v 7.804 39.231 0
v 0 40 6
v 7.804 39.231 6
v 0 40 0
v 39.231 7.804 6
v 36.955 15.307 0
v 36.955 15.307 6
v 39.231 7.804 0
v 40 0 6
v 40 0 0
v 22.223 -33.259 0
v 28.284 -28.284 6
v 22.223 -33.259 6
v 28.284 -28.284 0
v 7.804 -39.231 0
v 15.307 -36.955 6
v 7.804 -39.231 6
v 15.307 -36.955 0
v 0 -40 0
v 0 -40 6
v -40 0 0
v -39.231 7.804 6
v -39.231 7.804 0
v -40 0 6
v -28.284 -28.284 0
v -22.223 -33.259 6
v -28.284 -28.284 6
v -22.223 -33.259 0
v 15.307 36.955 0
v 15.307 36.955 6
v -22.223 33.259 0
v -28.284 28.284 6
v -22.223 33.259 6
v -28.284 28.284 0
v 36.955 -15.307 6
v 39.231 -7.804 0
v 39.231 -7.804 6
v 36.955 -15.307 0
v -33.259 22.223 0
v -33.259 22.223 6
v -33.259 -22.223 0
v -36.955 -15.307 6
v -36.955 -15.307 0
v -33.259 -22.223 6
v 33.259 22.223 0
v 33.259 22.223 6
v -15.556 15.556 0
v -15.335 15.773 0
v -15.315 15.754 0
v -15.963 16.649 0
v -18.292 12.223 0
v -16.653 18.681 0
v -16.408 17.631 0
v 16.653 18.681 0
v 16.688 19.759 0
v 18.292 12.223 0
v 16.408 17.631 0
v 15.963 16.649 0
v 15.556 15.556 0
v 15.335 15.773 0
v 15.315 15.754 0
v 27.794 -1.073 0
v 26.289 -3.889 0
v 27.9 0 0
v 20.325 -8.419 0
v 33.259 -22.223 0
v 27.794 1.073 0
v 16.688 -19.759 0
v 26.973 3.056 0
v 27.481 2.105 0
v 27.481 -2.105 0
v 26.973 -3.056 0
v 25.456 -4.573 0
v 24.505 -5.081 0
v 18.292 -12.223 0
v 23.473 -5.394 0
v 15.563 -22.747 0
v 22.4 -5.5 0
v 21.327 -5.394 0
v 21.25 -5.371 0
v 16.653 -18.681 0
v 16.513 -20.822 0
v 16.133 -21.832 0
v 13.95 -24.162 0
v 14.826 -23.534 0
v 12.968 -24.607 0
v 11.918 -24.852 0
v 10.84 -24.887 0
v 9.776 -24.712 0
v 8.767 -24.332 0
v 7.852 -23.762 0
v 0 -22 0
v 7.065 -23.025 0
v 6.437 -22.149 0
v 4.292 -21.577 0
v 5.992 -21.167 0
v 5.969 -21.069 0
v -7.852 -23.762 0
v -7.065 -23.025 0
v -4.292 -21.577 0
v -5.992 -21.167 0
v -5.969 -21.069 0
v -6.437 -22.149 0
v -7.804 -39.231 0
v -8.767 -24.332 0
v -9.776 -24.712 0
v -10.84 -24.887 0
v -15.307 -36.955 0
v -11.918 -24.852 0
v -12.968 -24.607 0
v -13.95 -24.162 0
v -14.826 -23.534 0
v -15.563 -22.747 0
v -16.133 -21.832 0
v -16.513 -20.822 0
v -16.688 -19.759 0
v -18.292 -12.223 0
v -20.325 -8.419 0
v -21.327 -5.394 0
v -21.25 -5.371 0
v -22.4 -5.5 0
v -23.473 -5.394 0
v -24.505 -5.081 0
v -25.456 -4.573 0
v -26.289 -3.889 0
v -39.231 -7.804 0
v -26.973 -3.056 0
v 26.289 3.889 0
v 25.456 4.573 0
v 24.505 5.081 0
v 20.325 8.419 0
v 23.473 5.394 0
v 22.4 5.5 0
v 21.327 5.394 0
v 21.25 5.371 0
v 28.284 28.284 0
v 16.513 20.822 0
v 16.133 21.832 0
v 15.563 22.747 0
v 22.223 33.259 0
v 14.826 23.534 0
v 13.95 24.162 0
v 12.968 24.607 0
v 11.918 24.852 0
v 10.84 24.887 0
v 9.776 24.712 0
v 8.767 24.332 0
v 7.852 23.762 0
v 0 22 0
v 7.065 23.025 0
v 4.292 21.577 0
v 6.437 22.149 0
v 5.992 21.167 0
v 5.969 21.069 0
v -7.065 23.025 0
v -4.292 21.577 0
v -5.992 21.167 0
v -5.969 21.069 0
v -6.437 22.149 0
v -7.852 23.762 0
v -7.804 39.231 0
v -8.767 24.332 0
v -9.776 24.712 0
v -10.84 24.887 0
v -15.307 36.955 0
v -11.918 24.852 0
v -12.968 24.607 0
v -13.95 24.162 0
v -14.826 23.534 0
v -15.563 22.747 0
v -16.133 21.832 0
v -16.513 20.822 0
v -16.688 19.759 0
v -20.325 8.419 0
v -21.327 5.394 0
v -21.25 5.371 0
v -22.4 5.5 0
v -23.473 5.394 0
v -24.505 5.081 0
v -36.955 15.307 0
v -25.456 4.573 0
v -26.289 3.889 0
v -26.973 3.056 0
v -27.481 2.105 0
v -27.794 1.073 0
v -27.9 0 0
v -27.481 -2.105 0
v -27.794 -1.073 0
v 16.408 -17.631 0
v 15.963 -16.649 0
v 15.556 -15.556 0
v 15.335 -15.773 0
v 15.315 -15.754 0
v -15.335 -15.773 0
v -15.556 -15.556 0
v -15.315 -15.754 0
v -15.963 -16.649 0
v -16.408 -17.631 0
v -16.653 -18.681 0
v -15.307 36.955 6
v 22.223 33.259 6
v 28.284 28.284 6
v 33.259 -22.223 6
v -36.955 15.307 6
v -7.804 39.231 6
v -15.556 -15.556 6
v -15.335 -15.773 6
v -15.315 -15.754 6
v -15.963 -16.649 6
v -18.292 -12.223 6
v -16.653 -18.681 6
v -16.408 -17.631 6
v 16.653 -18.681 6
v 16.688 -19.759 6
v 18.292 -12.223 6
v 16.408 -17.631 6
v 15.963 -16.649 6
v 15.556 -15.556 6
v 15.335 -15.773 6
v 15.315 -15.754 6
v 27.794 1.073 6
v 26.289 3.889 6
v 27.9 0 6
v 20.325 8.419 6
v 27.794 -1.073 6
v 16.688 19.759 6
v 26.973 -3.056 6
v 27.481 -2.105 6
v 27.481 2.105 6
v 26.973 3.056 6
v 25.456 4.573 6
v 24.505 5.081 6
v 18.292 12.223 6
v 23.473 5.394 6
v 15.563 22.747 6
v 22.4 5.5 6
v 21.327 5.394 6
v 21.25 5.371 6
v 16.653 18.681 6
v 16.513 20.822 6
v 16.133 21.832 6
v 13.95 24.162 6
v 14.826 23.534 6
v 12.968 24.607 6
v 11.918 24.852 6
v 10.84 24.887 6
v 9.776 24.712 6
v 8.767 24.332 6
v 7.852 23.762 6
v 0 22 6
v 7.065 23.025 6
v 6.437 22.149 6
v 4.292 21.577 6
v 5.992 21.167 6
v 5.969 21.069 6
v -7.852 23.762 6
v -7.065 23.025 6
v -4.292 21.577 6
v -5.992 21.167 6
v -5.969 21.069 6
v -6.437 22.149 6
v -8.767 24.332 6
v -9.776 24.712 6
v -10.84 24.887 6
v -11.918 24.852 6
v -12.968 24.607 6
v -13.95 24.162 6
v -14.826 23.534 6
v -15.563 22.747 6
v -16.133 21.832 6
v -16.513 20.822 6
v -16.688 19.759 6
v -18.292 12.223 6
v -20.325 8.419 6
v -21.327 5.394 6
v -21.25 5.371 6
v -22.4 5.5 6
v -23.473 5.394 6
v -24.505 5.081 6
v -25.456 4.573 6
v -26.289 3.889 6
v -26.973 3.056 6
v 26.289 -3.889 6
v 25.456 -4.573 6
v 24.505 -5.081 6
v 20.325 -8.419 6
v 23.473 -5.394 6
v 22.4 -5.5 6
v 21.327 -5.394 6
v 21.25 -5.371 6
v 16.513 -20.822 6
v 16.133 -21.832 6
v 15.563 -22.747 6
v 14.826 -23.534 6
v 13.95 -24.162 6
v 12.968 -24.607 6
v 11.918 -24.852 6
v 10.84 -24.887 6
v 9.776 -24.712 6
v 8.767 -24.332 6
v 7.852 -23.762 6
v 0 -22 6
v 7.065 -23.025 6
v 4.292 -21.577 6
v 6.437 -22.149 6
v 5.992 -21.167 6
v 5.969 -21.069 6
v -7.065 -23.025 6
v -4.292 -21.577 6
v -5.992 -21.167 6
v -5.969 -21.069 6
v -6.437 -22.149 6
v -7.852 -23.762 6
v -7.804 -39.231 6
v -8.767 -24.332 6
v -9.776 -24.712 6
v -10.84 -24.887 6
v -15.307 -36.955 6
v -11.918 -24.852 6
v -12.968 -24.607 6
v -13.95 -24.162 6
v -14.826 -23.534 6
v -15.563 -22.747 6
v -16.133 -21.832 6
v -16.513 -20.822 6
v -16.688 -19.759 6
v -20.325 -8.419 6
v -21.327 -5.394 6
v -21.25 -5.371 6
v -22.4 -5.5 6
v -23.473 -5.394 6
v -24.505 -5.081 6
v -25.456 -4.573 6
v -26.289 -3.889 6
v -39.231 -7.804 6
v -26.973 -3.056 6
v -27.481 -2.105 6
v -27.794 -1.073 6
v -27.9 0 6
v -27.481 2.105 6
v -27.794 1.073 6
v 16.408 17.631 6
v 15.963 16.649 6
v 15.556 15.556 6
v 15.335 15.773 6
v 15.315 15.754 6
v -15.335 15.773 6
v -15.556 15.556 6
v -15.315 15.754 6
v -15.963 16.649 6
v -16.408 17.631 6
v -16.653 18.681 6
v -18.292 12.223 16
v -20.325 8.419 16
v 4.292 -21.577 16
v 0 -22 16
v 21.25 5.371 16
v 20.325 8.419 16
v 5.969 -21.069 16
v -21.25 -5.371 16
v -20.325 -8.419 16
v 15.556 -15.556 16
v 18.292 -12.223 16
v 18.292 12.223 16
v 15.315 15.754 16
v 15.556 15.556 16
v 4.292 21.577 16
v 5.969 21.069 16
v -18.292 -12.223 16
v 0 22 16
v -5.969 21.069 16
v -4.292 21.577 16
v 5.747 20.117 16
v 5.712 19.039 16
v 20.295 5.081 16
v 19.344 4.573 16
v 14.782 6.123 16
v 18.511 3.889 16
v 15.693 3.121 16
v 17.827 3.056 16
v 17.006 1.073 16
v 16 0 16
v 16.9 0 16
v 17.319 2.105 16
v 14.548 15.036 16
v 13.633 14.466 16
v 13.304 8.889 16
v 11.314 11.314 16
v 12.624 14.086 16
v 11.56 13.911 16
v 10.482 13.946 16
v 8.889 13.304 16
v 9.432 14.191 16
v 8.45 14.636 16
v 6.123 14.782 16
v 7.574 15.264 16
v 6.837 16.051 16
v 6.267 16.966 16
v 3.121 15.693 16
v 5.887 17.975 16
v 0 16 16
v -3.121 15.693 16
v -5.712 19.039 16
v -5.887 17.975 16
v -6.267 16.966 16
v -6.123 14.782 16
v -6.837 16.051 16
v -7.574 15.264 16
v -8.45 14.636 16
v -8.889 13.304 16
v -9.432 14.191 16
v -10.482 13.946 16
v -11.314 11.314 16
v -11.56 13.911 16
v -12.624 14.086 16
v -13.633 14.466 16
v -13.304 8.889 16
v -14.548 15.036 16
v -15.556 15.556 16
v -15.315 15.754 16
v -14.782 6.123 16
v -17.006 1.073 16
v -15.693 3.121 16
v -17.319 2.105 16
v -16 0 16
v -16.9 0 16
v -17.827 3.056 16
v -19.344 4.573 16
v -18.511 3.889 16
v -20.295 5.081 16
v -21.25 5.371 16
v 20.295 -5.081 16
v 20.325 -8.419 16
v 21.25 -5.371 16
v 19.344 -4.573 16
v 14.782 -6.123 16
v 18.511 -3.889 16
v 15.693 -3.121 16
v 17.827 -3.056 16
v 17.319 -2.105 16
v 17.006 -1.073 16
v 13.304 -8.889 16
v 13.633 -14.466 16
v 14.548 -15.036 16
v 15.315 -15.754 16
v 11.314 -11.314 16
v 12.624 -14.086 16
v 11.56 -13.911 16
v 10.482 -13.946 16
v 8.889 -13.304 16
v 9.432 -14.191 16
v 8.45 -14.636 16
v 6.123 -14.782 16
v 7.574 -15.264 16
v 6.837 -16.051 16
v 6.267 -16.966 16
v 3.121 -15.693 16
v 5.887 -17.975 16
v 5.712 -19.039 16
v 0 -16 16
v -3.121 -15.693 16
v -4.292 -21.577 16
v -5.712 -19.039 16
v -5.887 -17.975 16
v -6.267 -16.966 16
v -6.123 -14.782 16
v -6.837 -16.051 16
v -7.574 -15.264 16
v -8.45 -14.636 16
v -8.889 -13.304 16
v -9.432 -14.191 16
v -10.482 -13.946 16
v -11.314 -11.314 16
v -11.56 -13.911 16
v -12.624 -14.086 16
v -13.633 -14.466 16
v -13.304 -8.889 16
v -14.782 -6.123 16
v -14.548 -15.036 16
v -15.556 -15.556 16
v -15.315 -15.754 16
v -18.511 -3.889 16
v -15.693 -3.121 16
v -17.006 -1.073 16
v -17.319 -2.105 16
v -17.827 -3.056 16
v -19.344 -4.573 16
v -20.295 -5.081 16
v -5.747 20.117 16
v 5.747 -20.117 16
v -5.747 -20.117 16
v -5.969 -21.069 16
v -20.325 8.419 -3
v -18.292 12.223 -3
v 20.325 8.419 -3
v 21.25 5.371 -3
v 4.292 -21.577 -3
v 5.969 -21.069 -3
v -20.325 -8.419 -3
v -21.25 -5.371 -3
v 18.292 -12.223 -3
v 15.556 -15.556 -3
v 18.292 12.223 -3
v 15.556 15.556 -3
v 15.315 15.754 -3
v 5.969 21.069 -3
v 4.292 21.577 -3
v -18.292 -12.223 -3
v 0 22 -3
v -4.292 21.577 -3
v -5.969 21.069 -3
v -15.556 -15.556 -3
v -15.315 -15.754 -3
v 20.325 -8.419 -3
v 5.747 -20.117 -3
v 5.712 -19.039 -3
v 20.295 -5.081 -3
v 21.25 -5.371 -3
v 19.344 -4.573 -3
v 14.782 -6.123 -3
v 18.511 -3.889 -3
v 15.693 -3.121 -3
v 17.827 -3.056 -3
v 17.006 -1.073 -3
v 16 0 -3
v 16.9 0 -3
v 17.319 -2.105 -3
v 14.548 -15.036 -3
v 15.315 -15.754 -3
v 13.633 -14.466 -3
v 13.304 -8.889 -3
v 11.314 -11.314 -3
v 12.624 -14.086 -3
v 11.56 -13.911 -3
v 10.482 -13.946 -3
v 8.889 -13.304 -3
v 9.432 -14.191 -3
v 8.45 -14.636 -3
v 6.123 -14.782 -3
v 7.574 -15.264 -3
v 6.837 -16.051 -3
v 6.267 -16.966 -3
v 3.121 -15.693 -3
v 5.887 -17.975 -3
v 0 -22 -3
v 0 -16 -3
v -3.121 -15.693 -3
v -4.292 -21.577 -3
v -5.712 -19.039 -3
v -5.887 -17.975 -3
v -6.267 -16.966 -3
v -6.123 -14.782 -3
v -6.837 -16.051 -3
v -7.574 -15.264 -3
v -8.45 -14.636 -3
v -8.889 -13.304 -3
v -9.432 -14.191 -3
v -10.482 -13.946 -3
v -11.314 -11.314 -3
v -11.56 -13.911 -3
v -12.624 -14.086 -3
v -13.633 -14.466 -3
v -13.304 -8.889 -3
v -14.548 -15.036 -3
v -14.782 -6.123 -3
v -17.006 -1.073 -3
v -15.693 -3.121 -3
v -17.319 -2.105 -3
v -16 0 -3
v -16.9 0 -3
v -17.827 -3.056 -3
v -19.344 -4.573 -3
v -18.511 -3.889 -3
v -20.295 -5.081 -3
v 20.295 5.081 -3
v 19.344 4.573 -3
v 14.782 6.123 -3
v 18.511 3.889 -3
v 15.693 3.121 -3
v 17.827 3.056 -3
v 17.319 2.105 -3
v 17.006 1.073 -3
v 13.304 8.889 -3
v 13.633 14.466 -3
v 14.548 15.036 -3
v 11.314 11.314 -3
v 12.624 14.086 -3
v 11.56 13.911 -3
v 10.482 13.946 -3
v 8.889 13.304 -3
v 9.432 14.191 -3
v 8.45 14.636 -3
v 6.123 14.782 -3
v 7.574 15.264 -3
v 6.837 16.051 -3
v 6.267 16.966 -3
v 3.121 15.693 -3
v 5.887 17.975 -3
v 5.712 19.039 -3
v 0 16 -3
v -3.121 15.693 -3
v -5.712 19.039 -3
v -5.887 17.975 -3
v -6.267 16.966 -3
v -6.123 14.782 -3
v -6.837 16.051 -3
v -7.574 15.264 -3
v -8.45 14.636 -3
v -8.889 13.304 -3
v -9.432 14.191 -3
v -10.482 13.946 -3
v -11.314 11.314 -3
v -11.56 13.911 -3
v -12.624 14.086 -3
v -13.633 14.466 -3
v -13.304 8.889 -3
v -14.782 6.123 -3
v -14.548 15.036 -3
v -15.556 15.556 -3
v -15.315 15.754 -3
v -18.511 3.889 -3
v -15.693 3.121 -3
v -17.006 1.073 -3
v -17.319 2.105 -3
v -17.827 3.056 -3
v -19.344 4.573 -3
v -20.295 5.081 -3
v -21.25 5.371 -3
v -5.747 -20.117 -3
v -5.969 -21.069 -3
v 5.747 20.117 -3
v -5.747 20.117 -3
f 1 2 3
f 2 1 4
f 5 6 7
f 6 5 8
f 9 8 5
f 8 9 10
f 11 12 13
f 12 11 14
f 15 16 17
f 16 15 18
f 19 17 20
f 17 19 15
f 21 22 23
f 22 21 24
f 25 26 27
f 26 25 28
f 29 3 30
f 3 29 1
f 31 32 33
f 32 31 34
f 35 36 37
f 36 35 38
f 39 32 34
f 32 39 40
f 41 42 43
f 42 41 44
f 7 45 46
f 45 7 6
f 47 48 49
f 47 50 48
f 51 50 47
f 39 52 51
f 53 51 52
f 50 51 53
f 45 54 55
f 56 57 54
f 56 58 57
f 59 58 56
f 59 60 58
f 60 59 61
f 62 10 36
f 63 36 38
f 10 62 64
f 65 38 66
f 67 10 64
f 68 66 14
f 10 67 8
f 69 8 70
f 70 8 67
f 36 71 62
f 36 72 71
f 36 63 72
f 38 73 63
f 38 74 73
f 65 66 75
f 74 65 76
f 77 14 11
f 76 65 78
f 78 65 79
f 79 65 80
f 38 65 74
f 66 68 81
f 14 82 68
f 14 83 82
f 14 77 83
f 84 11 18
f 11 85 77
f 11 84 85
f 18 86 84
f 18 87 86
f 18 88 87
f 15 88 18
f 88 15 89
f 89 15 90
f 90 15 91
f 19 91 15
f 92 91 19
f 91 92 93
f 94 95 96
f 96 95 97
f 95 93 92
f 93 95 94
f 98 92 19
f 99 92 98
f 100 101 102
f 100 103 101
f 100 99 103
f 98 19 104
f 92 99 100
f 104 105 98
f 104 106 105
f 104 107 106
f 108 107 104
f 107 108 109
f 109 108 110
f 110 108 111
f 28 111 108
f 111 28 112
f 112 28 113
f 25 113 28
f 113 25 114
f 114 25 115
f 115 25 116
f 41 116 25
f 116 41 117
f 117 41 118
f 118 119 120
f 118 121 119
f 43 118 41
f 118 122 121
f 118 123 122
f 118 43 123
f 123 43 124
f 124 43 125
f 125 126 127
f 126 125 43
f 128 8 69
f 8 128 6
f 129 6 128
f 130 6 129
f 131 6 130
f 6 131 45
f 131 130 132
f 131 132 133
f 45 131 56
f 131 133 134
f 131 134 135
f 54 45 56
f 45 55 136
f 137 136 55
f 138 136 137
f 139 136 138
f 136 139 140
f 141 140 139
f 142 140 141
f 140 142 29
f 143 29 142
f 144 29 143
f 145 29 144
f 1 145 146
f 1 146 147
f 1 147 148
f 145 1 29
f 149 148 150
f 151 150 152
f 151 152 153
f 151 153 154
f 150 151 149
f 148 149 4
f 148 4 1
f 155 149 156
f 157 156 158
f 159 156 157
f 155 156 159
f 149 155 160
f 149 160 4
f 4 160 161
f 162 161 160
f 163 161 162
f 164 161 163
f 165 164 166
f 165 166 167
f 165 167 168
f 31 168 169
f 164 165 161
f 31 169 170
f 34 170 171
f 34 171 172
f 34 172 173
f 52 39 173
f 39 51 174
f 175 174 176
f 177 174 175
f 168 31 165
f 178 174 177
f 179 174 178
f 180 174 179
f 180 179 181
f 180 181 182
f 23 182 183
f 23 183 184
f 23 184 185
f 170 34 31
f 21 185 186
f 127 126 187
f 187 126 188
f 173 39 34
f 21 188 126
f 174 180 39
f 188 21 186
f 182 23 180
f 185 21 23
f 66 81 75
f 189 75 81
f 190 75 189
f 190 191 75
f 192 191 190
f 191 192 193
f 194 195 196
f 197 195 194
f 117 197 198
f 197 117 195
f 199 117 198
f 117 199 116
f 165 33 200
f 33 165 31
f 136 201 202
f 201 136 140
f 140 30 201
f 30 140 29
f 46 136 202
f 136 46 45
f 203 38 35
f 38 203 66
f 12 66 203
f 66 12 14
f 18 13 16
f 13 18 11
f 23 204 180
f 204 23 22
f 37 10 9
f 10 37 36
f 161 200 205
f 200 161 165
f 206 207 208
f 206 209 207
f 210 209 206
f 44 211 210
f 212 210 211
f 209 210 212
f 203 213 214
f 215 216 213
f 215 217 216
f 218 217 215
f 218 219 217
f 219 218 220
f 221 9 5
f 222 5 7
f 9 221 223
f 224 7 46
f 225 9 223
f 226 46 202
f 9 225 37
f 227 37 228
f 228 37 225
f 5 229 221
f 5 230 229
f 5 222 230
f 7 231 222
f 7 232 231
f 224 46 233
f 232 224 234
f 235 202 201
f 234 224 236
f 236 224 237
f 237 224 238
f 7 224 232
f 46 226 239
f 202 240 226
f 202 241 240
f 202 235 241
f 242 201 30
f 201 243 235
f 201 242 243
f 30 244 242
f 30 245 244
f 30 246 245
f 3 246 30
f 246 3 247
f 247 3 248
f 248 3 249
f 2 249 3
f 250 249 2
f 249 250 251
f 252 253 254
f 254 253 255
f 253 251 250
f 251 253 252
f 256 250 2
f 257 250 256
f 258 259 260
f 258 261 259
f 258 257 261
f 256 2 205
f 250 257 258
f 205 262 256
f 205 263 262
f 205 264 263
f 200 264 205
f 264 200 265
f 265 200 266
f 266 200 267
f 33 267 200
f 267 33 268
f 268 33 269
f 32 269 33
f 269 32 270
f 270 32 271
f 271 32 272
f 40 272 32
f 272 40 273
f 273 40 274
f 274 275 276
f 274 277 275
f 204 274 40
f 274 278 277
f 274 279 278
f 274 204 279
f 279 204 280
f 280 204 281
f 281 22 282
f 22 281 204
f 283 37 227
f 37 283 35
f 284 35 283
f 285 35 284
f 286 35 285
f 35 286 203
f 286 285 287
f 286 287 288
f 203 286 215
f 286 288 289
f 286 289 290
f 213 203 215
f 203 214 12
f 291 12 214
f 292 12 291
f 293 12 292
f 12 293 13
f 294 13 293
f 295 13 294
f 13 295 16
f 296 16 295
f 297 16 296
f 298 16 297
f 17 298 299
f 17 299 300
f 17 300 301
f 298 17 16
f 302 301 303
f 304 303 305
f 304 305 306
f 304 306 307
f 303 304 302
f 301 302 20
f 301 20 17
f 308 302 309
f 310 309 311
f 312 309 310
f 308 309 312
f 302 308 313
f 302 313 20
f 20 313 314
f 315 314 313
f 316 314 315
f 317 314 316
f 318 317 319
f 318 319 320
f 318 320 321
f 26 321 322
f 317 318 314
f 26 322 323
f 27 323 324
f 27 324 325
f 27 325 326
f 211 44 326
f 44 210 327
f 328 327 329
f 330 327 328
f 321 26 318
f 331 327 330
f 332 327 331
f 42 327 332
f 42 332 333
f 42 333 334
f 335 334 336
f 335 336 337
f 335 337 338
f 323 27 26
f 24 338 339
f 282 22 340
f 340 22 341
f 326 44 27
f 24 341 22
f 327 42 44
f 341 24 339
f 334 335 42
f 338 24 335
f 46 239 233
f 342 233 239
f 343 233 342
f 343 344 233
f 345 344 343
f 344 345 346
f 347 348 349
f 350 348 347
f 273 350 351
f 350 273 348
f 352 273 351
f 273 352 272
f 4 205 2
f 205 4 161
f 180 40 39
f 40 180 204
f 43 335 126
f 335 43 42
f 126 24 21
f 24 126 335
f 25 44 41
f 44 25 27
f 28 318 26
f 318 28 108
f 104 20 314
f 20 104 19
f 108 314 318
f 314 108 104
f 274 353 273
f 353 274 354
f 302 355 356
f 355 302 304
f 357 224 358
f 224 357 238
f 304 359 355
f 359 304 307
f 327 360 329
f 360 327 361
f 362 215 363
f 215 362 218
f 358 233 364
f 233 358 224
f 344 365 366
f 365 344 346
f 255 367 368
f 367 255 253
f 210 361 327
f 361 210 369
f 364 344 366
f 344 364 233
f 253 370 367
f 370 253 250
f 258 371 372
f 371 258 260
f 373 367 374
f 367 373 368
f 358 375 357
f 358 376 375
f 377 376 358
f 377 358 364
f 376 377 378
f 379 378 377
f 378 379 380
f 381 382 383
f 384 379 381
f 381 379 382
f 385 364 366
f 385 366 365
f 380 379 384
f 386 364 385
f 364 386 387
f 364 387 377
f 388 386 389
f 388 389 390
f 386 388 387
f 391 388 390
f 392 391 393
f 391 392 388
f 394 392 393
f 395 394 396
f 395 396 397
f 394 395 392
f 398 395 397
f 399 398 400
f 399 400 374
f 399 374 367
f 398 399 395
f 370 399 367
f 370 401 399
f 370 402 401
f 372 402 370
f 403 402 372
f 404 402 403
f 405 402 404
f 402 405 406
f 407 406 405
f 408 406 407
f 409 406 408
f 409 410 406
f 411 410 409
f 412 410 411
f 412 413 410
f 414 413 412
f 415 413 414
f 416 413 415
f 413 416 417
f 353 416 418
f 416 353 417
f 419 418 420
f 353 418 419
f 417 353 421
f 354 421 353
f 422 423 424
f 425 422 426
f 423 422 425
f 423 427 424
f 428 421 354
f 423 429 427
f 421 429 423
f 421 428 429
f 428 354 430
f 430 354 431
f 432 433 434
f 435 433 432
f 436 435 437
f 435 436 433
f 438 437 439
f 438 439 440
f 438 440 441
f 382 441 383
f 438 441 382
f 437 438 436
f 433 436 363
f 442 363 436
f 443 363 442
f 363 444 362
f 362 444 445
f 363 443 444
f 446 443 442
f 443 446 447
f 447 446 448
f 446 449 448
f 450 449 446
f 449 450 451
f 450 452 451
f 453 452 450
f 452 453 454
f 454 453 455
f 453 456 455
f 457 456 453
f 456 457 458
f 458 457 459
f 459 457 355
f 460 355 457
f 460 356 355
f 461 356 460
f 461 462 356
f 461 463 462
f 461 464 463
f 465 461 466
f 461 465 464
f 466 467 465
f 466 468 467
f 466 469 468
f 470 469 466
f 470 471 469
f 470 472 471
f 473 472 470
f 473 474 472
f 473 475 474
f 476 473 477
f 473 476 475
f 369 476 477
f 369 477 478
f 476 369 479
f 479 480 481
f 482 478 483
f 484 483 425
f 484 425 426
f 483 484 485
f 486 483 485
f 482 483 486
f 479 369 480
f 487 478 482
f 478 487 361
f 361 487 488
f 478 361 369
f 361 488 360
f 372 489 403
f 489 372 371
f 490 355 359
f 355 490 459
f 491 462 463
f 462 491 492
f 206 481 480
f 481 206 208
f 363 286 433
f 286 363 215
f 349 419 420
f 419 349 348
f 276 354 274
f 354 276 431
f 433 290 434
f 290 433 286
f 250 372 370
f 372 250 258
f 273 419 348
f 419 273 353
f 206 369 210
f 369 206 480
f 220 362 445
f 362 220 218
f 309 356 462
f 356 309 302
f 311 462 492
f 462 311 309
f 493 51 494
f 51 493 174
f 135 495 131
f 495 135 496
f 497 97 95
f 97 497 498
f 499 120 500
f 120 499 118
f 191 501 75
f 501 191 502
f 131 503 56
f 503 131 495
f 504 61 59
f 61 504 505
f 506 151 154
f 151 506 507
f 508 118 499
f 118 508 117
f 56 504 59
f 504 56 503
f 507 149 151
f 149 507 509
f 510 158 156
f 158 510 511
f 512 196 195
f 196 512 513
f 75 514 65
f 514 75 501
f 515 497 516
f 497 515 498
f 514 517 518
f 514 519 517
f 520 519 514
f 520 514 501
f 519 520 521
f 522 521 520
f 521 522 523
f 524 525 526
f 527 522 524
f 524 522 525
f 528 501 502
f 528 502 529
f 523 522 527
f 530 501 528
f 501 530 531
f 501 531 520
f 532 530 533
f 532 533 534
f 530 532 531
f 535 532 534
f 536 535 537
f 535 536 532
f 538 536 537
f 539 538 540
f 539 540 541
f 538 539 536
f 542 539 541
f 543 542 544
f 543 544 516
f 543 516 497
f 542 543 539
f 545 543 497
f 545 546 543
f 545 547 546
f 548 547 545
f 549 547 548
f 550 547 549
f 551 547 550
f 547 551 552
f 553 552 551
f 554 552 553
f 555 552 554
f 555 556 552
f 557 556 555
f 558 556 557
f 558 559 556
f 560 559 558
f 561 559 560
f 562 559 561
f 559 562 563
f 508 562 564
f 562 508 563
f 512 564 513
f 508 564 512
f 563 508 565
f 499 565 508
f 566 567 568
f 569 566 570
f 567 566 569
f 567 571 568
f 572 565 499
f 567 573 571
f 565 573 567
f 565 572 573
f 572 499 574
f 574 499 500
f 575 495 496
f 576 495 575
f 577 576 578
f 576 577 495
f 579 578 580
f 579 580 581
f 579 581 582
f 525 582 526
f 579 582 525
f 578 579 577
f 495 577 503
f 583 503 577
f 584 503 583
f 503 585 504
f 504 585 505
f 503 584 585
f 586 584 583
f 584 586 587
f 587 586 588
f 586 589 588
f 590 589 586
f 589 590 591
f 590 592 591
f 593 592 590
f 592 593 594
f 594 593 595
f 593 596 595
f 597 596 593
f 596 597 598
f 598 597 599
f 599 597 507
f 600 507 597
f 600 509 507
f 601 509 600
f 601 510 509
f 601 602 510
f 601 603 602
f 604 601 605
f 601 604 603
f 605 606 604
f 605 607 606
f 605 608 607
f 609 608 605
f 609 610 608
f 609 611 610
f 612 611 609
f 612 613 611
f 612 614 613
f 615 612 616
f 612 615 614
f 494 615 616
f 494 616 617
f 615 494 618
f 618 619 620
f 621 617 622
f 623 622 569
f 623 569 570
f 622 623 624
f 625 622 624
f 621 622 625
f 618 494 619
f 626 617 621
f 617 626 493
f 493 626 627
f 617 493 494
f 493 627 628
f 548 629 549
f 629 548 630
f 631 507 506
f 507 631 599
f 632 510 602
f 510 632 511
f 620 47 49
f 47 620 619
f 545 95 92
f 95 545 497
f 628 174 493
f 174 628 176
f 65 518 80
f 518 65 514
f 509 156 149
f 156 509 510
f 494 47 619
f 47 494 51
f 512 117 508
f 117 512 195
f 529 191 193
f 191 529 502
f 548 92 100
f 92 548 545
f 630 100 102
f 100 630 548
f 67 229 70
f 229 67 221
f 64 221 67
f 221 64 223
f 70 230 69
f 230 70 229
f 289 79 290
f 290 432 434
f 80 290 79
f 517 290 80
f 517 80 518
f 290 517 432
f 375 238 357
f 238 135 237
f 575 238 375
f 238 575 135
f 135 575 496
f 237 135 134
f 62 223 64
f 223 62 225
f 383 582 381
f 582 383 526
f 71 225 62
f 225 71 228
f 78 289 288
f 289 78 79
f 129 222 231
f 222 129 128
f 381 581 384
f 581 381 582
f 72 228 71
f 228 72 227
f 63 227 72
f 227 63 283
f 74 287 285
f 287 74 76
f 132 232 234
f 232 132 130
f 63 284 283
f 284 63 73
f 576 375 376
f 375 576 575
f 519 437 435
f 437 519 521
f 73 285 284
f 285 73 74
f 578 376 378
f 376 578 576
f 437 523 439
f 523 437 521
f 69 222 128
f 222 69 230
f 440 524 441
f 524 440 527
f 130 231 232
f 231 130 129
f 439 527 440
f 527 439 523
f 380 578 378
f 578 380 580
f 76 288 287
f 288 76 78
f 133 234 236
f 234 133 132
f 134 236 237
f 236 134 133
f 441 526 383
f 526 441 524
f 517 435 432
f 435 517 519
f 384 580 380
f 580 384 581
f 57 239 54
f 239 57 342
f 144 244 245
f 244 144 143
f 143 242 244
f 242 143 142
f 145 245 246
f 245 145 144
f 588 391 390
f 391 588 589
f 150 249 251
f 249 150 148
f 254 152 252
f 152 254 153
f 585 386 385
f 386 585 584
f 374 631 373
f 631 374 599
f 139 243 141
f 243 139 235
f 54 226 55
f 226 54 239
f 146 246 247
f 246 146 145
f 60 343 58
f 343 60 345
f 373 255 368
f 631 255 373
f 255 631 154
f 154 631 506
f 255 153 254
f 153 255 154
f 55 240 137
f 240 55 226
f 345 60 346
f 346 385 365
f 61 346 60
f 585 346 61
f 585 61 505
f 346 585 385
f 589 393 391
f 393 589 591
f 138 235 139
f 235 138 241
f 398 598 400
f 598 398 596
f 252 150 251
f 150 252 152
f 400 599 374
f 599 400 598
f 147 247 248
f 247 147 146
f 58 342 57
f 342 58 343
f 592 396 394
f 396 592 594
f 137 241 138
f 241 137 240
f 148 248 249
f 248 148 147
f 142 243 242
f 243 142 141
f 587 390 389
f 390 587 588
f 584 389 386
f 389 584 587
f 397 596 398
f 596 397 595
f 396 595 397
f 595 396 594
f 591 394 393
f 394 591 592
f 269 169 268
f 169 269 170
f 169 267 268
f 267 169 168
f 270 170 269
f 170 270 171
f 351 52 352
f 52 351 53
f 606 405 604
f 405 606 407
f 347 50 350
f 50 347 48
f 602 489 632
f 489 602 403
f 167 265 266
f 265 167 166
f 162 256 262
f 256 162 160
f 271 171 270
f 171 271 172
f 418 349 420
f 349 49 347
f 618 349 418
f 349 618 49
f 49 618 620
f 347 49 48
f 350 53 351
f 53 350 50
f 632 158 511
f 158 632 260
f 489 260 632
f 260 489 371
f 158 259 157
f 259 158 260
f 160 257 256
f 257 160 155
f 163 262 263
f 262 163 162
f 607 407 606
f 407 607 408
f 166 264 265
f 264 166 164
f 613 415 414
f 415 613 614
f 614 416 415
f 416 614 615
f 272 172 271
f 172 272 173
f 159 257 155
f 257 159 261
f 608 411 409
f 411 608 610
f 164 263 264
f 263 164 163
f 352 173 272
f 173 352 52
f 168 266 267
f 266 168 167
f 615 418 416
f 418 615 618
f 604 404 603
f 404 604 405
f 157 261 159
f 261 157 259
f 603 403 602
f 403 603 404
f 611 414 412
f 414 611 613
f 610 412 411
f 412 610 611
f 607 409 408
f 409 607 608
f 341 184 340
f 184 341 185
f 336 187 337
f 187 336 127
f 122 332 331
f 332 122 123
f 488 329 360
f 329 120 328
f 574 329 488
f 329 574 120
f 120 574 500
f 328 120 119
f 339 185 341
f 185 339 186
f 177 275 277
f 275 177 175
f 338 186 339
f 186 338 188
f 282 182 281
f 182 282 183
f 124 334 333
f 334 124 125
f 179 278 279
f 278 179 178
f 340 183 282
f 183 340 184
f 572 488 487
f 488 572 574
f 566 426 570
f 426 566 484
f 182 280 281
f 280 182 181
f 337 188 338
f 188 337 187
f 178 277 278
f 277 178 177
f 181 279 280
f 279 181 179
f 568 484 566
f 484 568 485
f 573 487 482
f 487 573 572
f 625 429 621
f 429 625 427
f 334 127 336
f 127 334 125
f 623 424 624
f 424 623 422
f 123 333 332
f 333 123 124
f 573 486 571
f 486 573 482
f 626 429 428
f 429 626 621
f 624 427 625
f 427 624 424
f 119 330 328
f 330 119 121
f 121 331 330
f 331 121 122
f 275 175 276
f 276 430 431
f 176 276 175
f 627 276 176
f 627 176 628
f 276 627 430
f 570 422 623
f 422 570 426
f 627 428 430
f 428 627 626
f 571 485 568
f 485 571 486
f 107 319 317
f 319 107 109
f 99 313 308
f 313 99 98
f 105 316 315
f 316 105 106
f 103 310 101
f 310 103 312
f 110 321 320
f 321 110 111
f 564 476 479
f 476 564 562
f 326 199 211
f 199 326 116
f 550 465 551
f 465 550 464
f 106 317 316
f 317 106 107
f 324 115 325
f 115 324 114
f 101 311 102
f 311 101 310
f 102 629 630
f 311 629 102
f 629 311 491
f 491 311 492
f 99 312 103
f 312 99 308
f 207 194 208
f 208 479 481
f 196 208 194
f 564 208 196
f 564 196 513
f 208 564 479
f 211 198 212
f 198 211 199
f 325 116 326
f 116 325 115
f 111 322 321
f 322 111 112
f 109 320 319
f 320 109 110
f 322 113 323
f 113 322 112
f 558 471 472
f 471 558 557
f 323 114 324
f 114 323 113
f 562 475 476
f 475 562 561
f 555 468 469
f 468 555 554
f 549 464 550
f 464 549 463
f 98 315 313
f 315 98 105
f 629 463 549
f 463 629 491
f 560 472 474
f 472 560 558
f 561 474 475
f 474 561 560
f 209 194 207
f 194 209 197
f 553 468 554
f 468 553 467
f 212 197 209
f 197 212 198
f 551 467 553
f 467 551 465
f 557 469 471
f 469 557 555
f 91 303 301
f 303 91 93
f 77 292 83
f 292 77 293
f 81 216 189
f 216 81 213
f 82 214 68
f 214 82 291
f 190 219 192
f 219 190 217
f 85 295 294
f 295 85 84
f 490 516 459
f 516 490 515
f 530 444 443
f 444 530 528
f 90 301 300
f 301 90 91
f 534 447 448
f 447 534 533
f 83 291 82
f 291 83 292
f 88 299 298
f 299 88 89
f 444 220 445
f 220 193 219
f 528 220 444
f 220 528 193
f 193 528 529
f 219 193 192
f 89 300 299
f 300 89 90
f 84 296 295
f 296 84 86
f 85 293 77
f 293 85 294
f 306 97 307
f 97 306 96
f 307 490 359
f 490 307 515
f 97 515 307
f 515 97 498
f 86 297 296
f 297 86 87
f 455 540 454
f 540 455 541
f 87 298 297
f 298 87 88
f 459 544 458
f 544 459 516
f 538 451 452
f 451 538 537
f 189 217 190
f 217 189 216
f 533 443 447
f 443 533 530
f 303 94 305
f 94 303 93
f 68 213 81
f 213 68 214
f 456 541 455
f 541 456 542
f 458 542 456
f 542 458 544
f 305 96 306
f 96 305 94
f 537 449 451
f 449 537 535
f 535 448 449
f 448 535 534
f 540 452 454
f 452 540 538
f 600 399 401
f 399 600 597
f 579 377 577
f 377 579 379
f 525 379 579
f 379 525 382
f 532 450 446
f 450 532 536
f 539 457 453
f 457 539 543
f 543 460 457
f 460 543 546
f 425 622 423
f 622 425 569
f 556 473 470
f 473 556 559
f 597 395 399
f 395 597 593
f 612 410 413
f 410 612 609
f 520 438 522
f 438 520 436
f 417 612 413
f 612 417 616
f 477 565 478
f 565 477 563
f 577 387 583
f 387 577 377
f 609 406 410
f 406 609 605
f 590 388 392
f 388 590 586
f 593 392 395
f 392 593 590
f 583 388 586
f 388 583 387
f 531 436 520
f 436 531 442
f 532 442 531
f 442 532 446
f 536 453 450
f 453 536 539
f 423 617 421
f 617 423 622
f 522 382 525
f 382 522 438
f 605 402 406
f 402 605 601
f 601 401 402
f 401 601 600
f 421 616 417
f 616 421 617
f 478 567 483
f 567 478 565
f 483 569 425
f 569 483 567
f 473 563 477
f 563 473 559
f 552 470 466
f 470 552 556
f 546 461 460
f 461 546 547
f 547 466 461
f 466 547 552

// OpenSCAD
$fn = 32;

// ----------------------------------------------------------------------
// Bolt-circle flange: 80 mm outside, 6 bolt holes, bore 32 mm
// ----------------------------------------------------------------------

// --- parameters (mm) ---
flange_d = 80;            // flange outside diameter
flange_t = 6;             // flange thickness
bolts = 6;                // number of bolt holes
bolt_d = 11;              // bolt clearance
bolt_r = 22.4;            // bolt circle radius
bore_d = 32;              // centre bore
hub_d = 44;               // raised hub diameter
hub_h = 10;               // raised hub height
spigot_d = 44;            // spigot diameter
spigot_h = 4;             // spigot height below the flange
sink = 1;                 // overlap into the flange

module body() {
  cylinder(h = flange_t, d = flange_d);
  /* raised hub, sunk 1 mm into the flange */
  translate([0, 0, flange_t - 1]) cylinder(h = hub_h + 1, d = hub_d);
  /* spigot on the back face, sunk into the flange */
  translate([0, 0, -spigot_h + sink]) cylinder(h = spigot_h, d = spigot_d);
}

difference() {
  body();
  /* bolt circle */
  for (i = [0 : bolts - 1]) rotate([0, 0, i * 360 / bolts]) translate([bolt_r, 0, -spigot_h - 1]) cylinder(h = flange_t + hub_h + spigot_h + 3, d = bolt_d);
  translate([0, 0, -spigot_h - 1]) cylinder(h = flange_t + hub_h + spigot_h + 3, d = bore_d);
}
